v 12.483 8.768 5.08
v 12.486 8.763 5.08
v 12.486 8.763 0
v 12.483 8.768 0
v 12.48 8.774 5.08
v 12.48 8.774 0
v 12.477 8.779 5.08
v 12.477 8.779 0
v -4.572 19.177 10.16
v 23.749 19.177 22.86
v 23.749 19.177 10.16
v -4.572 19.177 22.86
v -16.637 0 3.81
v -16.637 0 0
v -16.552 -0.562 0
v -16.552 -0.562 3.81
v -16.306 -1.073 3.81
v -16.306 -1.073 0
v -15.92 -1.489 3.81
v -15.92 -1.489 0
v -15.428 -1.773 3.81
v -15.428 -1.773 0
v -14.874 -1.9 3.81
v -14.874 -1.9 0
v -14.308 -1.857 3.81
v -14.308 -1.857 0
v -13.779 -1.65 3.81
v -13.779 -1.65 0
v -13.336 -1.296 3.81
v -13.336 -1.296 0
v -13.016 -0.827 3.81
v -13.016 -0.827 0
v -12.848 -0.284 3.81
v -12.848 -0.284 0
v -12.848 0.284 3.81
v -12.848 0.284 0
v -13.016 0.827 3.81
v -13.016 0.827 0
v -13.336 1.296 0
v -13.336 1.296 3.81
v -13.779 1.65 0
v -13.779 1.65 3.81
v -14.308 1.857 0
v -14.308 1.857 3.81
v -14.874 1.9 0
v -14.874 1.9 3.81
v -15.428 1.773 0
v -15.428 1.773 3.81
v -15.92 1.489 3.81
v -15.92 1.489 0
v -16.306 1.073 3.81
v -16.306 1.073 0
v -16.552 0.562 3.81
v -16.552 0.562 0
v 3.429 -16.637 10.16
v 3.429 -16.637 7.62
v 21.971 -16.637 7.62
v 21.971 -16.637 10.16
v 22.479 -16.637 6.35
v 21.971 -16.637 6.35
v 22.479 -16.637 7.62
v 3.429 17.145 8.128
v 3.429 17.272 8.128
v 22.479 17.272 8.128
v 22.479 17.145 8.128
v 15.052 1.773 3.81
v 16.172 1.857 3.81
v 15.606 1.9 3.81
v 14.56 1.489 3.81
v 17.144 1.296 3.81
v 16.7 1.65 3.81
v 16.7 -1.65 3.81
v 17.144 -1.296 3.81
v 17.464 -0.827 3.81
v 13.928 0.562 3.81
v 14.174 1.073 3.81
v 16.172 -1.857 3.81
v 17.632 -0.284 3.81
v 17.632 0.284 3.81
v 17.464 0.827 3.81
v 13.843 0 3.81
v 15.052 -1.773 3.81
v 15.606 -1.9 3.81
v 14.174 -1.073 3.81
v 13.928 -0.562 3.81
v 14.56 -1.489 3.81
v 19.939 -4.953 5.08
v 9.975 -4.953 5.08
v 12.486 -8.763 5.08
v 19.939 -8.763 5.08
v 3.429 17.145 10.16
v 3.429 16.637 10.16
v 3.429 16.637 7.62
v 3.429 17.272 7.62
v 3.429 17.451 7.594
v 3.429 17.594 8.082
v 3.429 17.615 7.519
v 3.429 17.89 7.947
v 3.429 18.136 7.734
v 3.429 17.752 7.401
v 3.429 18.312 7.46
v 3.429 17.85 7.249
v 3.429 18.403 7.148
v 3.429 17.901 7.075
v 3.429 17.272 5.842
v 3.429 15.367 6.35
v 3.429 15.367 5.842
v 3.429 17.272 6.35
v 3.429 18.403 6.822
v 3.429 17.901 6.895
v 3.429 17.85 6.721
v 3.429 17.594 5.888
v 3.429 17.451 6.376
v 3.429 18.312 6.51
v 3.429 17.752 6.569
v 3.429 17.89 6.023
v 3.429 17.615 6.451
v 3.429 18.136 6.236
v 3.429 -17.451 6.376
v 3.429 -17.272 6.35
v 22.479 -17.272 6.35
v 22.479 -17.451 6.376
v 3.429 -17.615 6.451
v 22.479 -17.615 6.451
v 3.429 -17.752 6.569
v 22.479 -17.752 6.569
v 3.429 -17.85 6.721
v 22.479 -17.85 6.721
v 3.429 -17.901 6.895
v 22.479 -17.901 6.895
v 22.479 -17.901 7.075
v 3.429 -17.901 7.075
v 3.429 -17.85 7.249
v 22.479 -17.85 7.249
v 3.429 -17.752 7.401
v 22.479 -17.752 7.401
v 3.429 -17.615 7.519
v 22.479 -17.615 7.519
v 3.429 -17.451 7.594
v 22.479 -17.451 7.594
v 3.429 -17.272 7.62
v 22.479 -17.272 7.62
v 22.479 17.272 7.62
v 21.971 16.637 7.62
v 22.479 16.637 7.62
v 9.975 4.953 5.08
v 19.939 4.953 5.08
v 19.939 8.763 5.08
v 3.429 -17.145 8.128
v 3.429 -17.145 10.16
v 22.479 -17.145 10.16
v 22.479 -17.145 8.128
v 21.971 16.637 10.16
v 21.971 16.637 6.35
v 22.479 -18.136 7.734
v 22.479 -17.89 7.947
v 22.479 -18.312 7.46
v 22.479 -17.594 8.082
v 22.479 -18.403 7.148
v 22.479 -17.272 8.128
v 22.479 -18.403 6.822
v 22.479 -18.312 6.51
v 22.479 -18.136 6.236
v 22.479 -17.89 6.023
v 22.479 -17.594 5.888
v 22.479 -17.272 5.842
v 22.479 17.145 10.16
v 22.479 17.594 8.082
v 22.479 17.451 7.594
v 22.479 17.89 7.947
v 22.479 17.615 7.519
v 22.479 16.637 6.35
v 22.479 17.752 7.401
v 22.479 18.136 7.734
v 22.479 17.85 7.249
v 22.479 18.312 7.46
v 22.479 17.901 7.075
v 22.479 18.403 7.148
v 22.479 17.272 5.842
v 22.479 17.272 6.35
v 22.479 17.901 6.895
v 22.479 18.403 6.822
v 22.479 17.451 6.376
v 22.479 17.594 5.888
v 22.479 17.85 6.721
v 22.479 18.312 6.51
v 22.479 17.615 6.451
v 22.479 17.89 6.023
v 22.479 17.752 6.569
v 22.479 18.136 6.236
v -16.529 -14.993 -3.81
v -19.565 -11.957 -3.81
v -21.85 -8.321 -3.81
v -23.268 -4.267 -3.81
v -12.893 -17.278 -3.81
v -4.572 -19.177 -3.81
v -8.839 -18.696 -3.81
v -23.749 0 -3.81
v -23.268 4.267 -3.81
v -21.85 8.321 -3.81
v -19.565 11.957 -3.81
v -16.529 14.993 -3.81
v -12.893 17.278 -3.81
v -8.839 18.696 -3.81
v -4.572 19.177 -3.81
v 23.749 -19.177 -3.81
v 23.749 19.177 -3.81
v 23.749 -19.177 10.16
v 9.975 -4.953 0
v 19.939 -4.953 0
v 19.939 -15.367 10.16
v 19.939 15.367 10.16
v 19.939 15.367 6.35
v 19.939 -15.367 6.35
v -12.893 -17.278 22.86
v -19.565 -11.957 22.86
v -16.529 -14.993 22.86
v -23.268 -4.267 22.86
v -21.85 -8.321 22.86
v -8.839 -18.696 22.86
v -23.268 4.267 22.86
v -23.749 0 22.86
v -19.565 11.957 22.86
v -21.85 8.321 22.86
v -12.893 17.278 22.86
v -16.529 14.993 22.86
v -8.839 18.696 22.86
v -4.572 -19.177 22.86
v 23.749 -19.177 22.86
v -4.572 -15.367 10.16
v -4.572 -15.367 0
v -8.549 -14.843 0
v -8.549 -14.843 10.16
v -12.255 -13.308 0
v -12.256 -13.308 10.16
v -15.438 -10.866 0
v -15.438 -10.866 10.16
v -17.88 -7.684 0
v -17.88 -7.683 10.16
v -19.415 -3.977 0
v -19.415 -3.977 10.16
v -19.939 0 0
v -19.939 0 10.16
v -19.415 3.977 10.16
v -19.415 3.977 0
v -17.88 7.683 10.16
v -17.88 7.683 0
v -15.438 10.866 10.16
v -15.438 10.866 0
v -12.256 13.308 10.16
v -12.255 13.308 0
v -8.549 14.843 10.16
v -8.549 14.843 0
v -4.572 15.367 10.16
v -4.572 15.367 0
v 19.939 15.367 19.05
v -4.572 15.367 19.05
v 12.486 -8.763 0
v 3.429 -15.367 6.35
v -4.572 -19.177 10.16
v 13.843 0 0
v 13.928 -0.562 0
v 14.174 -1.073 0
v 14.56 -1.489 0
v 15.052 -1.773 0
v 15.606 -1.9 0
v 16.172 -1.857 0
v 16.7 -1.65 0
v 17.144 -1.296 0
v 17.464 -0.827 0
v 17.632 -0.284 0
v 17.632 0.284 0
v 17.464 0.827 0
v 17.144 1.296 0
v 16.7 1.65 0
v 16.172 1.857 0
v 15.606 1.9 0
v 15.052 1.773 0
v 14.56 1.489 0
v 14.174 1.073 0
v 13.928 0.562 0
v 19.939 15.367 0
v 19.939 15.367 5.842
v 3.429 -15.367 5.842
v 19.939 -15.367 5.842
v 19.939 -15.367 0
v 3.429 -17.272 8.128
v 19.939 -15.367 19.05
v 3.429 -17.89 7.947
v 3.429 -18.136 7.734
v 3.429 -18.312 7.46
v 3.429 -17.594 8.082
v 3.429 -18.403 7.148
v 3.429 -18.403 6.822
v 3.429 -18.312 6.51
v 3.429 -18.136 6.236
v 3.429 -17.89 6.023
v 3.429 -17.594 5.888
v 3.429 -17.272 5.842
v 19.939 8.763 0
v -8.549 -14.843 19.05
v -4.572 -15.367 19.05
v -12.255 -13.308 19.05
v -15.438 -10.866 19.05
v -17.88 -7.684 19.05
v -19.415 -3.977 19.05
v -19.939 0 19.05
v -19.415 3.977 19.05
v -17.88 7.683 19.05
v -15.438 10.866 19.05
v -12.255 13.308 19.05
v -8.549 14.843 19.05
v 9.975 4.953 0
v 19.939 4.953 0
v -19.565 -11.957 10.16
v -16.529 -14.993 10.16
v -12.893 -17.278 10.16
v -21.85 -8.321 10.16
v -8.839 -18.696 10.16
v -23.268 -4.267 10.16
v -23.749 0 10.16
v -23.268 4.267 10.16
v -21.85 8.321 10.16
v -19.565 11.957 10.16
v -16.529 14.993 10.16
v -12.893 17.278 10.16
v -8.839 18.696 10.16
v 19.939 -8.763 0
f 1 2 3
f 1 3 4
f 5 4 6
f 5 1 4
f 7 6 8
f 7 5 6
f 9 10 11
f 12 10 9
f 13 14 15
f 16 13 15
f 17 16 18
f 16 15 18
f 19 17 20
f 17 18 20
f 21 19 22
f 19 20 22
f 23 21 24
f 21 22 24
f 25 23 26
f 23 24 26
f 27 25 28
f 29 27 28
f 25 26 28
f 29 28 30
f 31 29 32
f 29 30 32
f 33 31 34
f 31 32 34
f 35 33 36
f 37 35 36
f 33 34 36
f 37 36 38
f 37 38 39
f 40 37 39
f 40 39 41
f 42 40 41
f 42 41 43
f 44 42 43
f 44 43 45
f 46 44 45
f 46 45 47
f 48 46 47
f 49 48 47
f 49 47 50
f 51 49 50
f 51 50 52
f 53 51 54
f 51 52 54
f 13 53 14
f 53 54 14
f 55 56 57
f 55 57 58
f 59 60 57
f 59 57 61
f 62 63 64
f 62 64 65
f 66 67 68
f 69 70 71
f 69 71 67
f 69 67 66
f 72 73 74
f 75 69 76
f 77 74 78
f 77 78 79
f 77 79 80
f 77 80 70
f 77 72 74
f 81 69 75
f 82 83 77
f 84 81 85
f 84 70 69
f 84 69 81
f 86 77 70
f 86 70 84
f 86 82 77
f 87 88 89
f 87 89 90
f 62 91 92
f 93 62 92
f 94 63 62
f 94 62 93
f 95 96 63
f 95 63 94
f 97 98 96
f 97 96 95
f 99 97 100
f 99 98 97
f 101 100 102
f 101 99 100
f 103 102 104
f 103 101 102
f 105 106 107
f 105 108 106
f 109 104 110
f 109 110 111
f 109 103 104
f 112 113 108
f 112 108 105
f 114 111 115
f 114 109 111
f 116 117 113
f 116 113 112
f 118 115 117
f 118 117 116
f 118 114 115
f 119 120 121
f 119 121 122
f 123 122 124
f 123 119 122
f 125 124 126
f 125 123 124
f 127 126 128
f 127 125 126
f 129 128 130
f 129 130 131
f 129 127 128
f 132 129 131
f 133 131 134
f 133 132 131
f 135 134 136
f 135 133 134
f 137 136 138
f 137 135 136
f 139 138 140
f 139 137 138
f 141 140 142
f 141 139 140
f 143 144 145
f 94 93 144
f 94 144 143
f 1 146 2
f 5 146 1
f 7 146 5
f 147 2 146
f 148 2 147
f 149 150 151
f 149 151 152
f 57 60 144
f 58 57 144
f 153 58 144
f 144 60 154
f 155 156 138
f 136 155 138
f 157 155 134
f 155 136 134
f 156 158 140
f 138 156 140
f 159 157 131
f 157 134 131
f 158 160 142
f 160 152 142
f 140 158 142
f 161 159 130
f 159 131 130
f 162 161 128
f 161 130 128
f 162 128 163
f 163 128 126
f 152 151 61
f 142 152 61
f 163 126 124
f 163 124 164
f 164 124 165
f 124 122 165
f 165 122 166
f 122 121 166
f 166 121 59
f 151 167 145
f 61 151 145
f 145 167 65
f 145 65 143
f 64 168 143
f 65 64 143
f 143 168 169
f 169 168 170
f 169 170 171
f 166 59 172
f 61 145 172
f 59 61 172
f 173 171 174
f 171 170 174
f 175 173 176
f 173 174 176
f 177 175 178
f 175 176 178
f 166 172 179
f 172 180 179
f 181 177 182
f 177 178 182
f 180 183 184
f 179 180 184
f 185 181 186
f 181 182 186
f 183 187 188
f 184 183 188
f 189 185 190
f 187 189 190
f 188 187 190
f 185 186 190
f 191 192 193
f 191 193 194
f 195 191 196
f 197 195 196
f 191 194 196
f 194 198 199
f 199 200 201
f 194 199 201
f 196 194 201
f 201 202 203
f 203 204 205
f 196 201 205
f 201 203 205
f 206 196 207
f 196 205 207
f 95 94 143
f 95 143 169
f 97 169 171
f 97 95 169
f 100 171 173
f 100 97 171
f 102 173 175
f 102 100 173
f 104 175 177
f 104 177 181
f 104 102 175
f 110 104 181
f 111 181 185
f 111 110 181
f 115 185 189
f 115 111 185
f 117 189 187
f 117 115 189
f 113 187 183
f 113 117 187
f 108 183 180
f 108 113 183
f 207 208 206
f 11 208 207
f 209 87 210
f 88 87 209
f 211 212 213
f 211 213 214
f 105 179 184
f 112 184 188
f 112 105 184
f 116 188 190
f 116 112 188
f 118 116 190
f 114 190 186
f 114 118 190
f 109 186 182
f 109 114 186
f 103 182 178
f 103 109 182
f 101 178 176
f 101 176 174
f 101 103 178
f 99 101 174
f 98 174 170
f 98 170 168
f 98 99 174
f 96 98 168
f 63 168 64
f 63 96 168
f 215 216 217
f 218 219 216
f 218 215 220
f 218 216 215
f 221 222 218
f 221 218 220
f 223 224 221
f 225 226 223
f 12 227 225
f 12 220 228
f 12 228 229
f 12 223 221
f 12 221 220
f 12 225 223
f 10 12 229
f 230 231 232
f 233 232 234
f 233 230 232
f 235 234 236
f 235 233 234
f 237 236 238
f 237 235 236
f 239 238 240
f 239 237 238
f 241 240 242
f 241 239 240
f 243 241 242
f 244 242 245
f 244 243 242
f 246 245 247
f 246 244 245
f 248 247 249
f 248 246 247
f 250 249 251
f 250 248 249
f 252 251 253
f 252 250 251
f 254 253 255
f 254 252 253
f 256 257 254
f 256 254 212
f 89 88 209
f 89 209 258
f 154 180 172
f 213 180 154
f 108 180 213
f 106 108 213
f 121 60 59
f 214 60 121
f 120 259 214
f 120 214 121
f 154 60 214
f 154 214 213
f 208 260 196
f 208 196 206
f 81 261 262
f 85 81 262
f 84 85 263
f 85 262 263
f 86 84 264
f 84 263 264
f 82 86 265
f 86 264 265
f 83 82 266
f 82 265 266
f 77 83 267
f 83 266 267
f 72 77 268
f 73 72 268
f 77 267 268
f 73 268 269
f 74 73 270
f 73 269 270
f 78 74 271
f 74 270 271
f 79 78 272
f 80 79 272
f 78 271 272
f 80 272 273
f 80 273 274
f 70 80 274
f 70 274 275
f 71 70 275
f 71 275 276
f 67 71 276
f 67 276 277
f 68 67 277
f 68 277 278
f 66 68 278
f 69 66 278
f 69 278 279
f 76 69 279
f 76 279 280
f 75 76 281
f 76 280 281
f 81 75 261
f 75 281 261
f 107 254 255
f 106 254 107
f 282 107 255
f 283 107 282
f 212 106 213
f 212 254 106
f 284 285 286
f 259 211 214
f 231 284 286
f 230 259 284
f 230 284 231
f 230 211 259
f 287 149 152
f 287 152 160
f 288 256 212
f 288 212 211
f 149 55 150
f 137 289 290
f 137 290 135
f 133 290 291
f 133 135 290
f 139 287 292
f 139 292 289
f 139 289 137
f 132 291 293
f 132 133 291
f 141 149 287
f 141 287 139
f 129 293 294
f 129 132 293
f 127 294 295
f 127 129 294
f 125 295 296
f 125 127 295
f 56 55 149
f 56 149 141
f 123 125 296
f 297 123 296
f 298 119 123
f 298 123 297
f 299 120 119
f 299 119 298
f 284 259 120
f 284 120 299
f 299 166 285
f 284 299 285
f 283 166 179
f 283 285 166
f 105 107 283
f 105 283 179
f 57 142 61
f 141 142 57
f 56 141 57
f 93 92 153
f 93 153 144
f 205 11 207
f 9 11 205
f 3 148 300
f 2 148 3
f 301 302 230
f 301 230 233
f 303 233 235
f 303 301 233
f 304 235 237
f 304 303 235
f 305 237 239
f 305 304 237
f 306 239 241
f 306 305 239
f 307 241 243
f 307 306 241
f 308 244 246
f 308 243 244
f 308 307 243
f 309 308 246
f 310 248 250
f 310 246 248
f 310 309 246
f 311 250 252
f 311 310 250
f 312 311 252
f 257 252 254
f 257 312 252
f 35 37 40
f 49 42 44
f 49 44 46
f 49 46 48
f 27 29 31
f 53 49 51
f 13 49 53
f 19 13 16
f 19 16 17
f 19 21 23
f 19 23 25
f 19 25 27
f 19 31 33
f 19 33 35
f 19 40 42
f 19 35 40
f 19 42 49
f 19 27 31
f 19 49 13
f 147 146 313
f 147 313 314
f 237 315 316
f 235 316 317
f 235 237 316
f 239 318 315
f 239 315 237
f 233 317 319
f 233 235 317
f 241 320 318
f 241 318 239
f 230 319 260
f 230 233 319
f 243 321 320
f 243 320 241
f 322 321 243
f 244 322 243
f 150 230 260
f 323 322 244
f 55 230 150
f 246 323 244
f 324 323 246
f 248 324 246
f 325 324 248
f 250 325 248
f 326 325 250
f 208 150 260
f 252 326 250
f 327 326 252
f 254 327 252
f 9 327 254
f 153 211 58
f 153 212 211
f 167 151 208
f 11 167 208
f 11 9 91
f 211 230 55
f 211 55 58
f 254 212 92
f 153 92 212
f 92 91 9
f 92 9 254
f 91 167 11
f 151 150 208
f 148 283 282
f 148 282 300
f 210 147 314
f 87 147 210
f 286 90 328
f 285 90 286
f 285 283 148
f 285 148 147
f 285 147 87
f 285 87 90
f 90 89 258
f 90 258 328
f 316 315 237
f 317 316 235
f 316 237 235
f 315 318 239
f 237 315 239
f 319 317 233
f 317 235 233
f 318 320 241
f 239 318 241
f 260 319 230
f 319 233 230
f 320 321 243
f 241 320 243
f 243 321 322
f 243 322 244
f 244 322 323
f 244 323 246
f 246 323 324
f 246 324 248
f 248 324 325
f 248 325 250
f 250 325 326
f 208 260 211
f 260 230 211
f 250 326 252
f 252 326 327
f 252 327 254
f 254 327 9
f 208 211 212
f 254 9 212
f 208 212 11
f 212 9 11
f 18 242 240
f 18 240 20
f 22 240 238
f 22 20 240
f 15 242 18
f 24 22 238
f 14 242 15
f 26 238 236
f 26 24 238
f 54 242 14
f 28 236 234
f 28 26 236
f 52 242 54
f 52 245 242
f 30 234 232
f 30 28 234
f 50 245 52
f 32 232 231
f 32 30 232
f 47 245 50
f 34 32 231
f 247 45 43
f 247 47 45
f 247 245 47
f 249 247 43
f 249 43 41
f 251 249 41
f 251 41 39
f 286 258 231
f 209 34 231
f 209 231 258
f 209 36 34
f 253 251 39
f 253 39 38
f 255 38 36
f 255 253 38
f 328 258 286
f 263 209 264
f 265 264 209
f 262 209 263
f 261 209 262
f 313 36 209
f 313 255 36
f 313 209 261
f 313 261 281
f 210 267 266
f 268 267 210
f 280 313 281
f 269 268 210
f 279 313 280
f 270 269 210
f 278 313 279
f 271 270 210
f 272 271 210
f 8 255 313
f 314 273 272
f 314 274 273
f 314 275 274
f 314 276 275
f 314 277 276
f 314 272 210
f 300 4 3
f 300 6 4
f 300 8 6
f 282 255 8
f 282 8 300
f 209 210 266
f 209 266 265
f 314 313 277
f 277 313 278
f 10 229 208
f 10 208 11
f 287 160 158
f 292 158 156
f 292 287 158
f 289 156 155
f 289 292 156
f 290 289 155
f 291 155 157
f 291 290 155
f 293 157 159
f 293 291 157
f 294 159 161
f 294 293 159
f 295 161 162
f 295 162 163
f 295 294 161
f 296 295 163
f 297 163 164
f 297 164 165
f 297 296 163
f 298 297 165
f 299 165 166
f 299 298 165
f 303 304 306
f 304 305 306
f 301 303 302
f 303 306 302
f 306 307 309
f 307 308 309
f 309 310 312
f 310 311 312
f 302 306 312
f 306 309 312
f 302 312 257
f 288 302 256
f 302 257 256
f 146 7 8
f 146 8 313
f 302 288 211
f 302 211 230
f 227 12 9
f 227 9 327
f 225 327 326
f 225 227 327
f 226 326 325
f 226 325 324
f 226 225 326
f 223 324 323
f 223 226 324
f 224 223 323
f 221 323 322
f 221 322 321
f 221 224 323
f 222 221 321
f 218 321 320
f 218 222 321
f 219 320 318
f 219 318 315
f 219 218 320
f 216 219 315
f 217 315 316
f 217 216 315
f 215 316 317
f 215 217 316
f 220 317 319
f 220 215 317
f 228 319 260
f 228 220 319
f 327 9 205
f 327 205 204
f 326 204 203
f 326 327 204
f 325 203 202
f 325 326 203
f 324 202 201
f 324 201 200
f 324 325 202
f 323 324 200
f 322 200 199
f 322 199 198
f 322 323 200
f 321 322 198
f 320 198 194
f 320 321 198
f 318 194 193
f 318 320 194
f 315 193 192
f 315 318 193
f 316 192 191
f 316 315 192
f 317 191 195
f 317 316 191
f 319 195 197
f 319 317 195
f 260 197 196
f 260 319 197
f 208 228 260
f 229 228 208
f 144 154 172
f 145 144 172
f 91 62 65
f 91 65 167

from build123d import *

# Parameters (mm, degrees)
BASE_EXTRUDE_DEPTH      = 3.81
WALLS_START             = 19.05
WALLS_EXTRUDE_DEPTH     = 19.05
TOP_START               = 3.81
TOP_EXTRUDE_DEPTH       = 3.81
BOARD_START             = 5.08
BOARD_HOLDERS_DEPTH     = 5.08
STANDOFFS_R             = 1.905
BOSS_EXTRUDE5_DEPTH     = 3.81
CUT_EXTRUDE1_START      = -5.08
CUT_EXTRUDE1_DEPTH      = 19.05
CUT_EXTRUDE2_DEPTH      = 1.27
CUT_EXTRUDE2_DEPTH_BACK = 11.43
BACK_EDGE_CUTOUT_W      = 0.508
BACK_EDGE_CUTOUT_H      = 33.274


# Read off the part's stored shape, not the designer's step: Cut-Extrude1
with BuildPart() as part:
    # walls → Base extrude (new body)
    with BuildSketch(Plane.XY):
        with BuildLine():
            Line((23.749, -19.177), (23.749, 19.177))
            Line((23.749, 19.177), (-4.572, 19.177))
            ThreePointArc((-4.572, 19.177), (-23.749, 0), (-4.572, -19.177))
            Line((-4.572, -19.177), (23.749, -19.177))
        make_face()
    extrude(amount=-BASE_EXTRUDE_DEPTH)

    # walls<4> → Walls Extrude (add)
    with BuildSketch(Plane.XY.offset(WALLS_START)):
        with BuildLine():
            Line((23.749, -19.177), (23.749, -8.763))
            Line((23.749, -8.763), (23.749, 8.763))
            Line((23.749, 8.763), (23.749, 19.177))
            Line((23.749, 19.177), (-4.572, 19.177))
            ThreePointArc((-4.572, 19.177), (-23.749, 0), (-4.572, -19.177))
            Line((-4.572, -19.177), (23.749, -19.177))
        make_face()
        with BuildLine():
            ThreePointArc((-4.572, -15.367), (-19.939, 0), (-4.572, 15.367))
            Line((-4.572, 15.367), (19.939, 15.367))
            Line((19.939, 15.367), (19.939, 8.763))
            Line((19.939, 8.763), (19.939, 4.953))
            Line((19.939, 4.953), (19.939, -4.953))
            Line((19.939, -4.953), (19.939, -8.763))
            Line((19.939, -8.763), (19.939, -15.367))
            Line((19.939, -15.367), (-4.572, -15.367))
        make_face(mode=Mode.SUBTRACT)
    extrude(amount=-WALLS_EXTRUDE_DEPTH)

    # Sketch2 → Top Extrude (add)
    with BuildSketch(Plane.XY.offset(19.05).offset(TOP_START)):
        with BuildLine():
            Line((23.749, 19.177), (-4.572, 19.177))
            ThreePointArc((-4.572, 19.177), (-23.749, 0), (-4.572, -19.177))
            Line((-4.572, -19.177), (23.749, -19.177))
            Line((23.749, -19.177), (23.749, 19.177))
        make_face()
    extrude(amount=-TOP_EXTRUDE_DEPTH)

    # walls<5> → board holders (add)
    with BuildSketch(Plane.XY.offset(BOARD_START)):
        with BuildLine():
            Line((12.477349839, 8.77935072), (9.9749062, 4.953))
            Line((9.9749062, 4.953), (19.939, 4.953))
            Line((19.939, 4.953), (19.939, 8.763))
            Line((19.939, 8.763), (12.485759525, 8.763))
            ThreePointArc((12.485759525, 8.763), (12.481556641, 8.771176368), (12.477349839, 8.77935072))
        make_face()
        Polygon((19.939, -4.953), (9.9749062, -4.953), (12.485759525, -8.763), (19.939, -8.763), align=None)
    extrude(amount=-BOARD_HOLDERS_DEPTH)

    # standoffs → Boss-Extrude5 (add)
    with BuildSketch(Plane.XY):
        with Locations(Location((15.748, 0, 0), (0, 0, 180))):
            Circle(STANDOFFS_R)
        with Locations(Location((-14.732, 0, 0), (0, 0, 180))):
            Circle(STANDOFFS_R)
    extrude(amount=BOSS_EXTRUDE5_DEPTH)


with BuildPart() as body_2:
    # Split1: the piece on the far side of the plane
    add(part.part)
    split(bisect_by=Plane.XY.offset(10.16), keep=Keep.BOTTOM)

    # Cut-Extrude1 outline → Cut-Extrude1 (cut)
    with BuildSketch(Plane(origin=(8.509, 0, 0), x_dir=(0, 0, -1), z_dir=(1, 0, 0)).offset(CUT_EXTRUDE1_START)):
        with BuildLine():
            ThreePointArc((-8.128, -17.272), (-6.985, -18.415), (-5.842, -17.272))
            Line((-5.842, -17.272), (-5.842, 17.272))
            ThreePointArc((-5.842, 17.272), (-6.985, 18.415), (-8.128, 17.272))
            Line((-8.128, 17.272), (-8.128, 17.145))
            Line((-8.128, 17.145), (-10.16, 17.145))
            Line((-10.16, 17.145), (-10.16, 16.637))
            Line((-10.16, 16.637), (-7.62, 16.637))
            Line((-7.62, 16.637), (-7.62, 17.272))
            ThreePointArc((-7.62, 17.272), (-6.985, 17.907), (-6.35, 17.272))
            Line((-6.35, 17.272), (-6.35, -17.272))
            ThreePointArc((-6.35, -17.272), (-6.985, -17.907), (-7.62, -17.272))
            Line((-7.62, -17.272), (-7.62, -16.637))
            Line((-7.62, -16.637), (-10.16, -16.637))
            Line((-10.16, -16.637), (-10.16, -17.145))
            Line((-10.16, -17.145), (-8.128, -17.145))
            Line((-8.128, -17.145), (-8.128, -17.272))
        make_face()
    extrude(amount=CUT_EXTRUDE1_DEPTH, mode=Mode.SUBTRACT)

    # back edge cutout → Cut-Extrude2 (cut, two sides: drawn at the far end of the back side and taken through both)
    with BuildSketch(Plane.XY.offset(17.78).offset(-CUT_EXTRUDE2_DEPTH_BACK)):
        with Locations((22.225, 0)):
            Rectangle(BACK_EDGE_CUTOUT_W, BACK_EDGE_CUTOUT_H)
    extrude(amount=CUT_EXTRUDE2_DEPTH + CUT_EXTRUDE2_DEPTH_BACK, mode=Mode.SUBTRACT)


with BuildPart() as part_1:
    add(part.part)

    # Split1
    split(bisect_by=Plane.XY.offset(10.16), keep=Keep.TOP)


solid = Compound([body_2.part, part_1.part])
